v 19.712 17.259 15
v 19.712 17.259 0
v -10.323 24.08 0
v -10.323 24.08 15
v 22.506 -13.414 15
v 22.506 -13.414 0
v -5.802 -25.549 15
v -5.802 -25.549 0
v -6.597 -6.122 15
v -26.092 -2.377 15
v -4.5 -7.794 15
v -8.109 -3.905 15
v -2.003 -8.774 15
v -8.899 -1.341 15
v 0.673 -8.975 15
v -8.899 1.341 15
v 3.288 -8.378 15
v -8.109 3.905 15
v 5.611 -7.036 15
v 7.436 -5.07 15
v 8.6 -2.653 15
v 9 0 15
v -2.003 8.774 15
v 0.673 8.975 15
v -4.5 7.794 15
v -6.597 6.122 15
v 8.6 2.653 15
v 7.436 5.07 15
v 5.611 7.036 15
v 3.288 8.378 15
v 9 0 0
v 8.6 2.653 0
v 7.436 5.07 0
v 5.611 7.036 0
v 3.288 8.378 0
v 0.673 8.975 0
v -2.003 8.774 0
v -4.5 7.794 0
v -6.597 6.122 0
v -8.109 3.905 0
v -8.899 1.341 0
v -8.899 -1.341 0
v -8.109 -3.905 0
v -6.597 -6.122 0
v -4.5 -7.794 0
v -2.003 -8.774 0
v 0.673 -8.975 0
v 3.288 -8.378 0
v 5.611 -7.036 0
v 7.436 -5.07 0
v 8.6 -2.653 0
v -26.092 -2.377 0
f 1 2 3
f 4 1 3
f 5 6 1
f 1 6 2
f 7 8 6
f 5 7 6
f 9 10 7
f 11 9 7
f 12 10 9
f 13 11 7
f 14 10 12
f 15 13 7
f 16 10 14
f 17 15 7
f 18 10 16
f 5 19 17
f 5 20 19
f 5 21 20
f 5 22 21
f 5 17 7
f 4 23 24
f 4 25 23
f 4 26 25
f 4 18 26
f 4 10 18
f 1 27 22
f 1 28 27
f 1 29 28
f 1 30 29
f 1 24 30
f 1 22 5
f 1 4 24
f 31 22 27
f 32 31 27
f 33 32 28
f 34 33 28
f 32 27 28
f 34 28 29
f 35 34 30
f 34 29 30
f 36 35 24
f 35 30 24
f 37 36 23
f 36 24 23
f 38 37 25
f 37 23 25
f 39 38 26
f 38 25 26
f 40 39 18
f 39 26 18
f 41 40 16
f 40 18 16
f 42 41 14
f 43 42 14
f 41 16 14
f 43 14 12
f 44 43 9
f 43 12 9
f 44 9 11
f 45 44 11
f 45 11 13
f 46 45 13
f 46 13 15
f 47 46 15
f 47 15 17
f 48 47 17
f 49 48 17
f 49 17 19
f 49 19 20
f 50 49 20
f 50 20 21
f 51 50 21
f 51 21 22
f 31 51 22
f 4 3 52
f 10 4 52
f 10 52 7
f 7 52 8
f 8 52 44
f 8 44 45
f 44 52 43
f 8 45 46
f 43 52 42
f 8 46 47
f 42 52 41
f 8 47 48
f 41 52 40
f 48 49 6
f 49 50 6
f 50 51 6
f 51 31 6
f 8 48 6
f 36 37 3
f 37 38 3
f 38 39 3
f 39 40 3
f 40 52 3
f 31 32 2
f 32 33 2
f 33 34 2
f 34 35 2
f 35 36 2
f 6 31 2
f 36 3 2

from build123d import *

# Parameters (mm, degrees)
F1_DEPTH = 15
F2_R     = 9
F3_DEPTH = 18


with BuildPart() as f1:
    # F0 (on Top) → F1 (new body)
    with BuildSketch(Plane.XY):
        Polygon((-5.802325, -25.549469), (22.505972, -13.413559), (19.711781, 17.259434), (-10.323421, 24.080476), (-26.092006, -2.376881), align=None)
    extrude(amount=F1_DEPTH)

    # F2 (on face) → F3 (cut)
    with BuildSketch(Plane.XY.offset(15)):
        Circle(F2_R)
    extrude(amount=-F3_DEPTH, mode=Mode.SUBTRACT)


solid = f1.part
